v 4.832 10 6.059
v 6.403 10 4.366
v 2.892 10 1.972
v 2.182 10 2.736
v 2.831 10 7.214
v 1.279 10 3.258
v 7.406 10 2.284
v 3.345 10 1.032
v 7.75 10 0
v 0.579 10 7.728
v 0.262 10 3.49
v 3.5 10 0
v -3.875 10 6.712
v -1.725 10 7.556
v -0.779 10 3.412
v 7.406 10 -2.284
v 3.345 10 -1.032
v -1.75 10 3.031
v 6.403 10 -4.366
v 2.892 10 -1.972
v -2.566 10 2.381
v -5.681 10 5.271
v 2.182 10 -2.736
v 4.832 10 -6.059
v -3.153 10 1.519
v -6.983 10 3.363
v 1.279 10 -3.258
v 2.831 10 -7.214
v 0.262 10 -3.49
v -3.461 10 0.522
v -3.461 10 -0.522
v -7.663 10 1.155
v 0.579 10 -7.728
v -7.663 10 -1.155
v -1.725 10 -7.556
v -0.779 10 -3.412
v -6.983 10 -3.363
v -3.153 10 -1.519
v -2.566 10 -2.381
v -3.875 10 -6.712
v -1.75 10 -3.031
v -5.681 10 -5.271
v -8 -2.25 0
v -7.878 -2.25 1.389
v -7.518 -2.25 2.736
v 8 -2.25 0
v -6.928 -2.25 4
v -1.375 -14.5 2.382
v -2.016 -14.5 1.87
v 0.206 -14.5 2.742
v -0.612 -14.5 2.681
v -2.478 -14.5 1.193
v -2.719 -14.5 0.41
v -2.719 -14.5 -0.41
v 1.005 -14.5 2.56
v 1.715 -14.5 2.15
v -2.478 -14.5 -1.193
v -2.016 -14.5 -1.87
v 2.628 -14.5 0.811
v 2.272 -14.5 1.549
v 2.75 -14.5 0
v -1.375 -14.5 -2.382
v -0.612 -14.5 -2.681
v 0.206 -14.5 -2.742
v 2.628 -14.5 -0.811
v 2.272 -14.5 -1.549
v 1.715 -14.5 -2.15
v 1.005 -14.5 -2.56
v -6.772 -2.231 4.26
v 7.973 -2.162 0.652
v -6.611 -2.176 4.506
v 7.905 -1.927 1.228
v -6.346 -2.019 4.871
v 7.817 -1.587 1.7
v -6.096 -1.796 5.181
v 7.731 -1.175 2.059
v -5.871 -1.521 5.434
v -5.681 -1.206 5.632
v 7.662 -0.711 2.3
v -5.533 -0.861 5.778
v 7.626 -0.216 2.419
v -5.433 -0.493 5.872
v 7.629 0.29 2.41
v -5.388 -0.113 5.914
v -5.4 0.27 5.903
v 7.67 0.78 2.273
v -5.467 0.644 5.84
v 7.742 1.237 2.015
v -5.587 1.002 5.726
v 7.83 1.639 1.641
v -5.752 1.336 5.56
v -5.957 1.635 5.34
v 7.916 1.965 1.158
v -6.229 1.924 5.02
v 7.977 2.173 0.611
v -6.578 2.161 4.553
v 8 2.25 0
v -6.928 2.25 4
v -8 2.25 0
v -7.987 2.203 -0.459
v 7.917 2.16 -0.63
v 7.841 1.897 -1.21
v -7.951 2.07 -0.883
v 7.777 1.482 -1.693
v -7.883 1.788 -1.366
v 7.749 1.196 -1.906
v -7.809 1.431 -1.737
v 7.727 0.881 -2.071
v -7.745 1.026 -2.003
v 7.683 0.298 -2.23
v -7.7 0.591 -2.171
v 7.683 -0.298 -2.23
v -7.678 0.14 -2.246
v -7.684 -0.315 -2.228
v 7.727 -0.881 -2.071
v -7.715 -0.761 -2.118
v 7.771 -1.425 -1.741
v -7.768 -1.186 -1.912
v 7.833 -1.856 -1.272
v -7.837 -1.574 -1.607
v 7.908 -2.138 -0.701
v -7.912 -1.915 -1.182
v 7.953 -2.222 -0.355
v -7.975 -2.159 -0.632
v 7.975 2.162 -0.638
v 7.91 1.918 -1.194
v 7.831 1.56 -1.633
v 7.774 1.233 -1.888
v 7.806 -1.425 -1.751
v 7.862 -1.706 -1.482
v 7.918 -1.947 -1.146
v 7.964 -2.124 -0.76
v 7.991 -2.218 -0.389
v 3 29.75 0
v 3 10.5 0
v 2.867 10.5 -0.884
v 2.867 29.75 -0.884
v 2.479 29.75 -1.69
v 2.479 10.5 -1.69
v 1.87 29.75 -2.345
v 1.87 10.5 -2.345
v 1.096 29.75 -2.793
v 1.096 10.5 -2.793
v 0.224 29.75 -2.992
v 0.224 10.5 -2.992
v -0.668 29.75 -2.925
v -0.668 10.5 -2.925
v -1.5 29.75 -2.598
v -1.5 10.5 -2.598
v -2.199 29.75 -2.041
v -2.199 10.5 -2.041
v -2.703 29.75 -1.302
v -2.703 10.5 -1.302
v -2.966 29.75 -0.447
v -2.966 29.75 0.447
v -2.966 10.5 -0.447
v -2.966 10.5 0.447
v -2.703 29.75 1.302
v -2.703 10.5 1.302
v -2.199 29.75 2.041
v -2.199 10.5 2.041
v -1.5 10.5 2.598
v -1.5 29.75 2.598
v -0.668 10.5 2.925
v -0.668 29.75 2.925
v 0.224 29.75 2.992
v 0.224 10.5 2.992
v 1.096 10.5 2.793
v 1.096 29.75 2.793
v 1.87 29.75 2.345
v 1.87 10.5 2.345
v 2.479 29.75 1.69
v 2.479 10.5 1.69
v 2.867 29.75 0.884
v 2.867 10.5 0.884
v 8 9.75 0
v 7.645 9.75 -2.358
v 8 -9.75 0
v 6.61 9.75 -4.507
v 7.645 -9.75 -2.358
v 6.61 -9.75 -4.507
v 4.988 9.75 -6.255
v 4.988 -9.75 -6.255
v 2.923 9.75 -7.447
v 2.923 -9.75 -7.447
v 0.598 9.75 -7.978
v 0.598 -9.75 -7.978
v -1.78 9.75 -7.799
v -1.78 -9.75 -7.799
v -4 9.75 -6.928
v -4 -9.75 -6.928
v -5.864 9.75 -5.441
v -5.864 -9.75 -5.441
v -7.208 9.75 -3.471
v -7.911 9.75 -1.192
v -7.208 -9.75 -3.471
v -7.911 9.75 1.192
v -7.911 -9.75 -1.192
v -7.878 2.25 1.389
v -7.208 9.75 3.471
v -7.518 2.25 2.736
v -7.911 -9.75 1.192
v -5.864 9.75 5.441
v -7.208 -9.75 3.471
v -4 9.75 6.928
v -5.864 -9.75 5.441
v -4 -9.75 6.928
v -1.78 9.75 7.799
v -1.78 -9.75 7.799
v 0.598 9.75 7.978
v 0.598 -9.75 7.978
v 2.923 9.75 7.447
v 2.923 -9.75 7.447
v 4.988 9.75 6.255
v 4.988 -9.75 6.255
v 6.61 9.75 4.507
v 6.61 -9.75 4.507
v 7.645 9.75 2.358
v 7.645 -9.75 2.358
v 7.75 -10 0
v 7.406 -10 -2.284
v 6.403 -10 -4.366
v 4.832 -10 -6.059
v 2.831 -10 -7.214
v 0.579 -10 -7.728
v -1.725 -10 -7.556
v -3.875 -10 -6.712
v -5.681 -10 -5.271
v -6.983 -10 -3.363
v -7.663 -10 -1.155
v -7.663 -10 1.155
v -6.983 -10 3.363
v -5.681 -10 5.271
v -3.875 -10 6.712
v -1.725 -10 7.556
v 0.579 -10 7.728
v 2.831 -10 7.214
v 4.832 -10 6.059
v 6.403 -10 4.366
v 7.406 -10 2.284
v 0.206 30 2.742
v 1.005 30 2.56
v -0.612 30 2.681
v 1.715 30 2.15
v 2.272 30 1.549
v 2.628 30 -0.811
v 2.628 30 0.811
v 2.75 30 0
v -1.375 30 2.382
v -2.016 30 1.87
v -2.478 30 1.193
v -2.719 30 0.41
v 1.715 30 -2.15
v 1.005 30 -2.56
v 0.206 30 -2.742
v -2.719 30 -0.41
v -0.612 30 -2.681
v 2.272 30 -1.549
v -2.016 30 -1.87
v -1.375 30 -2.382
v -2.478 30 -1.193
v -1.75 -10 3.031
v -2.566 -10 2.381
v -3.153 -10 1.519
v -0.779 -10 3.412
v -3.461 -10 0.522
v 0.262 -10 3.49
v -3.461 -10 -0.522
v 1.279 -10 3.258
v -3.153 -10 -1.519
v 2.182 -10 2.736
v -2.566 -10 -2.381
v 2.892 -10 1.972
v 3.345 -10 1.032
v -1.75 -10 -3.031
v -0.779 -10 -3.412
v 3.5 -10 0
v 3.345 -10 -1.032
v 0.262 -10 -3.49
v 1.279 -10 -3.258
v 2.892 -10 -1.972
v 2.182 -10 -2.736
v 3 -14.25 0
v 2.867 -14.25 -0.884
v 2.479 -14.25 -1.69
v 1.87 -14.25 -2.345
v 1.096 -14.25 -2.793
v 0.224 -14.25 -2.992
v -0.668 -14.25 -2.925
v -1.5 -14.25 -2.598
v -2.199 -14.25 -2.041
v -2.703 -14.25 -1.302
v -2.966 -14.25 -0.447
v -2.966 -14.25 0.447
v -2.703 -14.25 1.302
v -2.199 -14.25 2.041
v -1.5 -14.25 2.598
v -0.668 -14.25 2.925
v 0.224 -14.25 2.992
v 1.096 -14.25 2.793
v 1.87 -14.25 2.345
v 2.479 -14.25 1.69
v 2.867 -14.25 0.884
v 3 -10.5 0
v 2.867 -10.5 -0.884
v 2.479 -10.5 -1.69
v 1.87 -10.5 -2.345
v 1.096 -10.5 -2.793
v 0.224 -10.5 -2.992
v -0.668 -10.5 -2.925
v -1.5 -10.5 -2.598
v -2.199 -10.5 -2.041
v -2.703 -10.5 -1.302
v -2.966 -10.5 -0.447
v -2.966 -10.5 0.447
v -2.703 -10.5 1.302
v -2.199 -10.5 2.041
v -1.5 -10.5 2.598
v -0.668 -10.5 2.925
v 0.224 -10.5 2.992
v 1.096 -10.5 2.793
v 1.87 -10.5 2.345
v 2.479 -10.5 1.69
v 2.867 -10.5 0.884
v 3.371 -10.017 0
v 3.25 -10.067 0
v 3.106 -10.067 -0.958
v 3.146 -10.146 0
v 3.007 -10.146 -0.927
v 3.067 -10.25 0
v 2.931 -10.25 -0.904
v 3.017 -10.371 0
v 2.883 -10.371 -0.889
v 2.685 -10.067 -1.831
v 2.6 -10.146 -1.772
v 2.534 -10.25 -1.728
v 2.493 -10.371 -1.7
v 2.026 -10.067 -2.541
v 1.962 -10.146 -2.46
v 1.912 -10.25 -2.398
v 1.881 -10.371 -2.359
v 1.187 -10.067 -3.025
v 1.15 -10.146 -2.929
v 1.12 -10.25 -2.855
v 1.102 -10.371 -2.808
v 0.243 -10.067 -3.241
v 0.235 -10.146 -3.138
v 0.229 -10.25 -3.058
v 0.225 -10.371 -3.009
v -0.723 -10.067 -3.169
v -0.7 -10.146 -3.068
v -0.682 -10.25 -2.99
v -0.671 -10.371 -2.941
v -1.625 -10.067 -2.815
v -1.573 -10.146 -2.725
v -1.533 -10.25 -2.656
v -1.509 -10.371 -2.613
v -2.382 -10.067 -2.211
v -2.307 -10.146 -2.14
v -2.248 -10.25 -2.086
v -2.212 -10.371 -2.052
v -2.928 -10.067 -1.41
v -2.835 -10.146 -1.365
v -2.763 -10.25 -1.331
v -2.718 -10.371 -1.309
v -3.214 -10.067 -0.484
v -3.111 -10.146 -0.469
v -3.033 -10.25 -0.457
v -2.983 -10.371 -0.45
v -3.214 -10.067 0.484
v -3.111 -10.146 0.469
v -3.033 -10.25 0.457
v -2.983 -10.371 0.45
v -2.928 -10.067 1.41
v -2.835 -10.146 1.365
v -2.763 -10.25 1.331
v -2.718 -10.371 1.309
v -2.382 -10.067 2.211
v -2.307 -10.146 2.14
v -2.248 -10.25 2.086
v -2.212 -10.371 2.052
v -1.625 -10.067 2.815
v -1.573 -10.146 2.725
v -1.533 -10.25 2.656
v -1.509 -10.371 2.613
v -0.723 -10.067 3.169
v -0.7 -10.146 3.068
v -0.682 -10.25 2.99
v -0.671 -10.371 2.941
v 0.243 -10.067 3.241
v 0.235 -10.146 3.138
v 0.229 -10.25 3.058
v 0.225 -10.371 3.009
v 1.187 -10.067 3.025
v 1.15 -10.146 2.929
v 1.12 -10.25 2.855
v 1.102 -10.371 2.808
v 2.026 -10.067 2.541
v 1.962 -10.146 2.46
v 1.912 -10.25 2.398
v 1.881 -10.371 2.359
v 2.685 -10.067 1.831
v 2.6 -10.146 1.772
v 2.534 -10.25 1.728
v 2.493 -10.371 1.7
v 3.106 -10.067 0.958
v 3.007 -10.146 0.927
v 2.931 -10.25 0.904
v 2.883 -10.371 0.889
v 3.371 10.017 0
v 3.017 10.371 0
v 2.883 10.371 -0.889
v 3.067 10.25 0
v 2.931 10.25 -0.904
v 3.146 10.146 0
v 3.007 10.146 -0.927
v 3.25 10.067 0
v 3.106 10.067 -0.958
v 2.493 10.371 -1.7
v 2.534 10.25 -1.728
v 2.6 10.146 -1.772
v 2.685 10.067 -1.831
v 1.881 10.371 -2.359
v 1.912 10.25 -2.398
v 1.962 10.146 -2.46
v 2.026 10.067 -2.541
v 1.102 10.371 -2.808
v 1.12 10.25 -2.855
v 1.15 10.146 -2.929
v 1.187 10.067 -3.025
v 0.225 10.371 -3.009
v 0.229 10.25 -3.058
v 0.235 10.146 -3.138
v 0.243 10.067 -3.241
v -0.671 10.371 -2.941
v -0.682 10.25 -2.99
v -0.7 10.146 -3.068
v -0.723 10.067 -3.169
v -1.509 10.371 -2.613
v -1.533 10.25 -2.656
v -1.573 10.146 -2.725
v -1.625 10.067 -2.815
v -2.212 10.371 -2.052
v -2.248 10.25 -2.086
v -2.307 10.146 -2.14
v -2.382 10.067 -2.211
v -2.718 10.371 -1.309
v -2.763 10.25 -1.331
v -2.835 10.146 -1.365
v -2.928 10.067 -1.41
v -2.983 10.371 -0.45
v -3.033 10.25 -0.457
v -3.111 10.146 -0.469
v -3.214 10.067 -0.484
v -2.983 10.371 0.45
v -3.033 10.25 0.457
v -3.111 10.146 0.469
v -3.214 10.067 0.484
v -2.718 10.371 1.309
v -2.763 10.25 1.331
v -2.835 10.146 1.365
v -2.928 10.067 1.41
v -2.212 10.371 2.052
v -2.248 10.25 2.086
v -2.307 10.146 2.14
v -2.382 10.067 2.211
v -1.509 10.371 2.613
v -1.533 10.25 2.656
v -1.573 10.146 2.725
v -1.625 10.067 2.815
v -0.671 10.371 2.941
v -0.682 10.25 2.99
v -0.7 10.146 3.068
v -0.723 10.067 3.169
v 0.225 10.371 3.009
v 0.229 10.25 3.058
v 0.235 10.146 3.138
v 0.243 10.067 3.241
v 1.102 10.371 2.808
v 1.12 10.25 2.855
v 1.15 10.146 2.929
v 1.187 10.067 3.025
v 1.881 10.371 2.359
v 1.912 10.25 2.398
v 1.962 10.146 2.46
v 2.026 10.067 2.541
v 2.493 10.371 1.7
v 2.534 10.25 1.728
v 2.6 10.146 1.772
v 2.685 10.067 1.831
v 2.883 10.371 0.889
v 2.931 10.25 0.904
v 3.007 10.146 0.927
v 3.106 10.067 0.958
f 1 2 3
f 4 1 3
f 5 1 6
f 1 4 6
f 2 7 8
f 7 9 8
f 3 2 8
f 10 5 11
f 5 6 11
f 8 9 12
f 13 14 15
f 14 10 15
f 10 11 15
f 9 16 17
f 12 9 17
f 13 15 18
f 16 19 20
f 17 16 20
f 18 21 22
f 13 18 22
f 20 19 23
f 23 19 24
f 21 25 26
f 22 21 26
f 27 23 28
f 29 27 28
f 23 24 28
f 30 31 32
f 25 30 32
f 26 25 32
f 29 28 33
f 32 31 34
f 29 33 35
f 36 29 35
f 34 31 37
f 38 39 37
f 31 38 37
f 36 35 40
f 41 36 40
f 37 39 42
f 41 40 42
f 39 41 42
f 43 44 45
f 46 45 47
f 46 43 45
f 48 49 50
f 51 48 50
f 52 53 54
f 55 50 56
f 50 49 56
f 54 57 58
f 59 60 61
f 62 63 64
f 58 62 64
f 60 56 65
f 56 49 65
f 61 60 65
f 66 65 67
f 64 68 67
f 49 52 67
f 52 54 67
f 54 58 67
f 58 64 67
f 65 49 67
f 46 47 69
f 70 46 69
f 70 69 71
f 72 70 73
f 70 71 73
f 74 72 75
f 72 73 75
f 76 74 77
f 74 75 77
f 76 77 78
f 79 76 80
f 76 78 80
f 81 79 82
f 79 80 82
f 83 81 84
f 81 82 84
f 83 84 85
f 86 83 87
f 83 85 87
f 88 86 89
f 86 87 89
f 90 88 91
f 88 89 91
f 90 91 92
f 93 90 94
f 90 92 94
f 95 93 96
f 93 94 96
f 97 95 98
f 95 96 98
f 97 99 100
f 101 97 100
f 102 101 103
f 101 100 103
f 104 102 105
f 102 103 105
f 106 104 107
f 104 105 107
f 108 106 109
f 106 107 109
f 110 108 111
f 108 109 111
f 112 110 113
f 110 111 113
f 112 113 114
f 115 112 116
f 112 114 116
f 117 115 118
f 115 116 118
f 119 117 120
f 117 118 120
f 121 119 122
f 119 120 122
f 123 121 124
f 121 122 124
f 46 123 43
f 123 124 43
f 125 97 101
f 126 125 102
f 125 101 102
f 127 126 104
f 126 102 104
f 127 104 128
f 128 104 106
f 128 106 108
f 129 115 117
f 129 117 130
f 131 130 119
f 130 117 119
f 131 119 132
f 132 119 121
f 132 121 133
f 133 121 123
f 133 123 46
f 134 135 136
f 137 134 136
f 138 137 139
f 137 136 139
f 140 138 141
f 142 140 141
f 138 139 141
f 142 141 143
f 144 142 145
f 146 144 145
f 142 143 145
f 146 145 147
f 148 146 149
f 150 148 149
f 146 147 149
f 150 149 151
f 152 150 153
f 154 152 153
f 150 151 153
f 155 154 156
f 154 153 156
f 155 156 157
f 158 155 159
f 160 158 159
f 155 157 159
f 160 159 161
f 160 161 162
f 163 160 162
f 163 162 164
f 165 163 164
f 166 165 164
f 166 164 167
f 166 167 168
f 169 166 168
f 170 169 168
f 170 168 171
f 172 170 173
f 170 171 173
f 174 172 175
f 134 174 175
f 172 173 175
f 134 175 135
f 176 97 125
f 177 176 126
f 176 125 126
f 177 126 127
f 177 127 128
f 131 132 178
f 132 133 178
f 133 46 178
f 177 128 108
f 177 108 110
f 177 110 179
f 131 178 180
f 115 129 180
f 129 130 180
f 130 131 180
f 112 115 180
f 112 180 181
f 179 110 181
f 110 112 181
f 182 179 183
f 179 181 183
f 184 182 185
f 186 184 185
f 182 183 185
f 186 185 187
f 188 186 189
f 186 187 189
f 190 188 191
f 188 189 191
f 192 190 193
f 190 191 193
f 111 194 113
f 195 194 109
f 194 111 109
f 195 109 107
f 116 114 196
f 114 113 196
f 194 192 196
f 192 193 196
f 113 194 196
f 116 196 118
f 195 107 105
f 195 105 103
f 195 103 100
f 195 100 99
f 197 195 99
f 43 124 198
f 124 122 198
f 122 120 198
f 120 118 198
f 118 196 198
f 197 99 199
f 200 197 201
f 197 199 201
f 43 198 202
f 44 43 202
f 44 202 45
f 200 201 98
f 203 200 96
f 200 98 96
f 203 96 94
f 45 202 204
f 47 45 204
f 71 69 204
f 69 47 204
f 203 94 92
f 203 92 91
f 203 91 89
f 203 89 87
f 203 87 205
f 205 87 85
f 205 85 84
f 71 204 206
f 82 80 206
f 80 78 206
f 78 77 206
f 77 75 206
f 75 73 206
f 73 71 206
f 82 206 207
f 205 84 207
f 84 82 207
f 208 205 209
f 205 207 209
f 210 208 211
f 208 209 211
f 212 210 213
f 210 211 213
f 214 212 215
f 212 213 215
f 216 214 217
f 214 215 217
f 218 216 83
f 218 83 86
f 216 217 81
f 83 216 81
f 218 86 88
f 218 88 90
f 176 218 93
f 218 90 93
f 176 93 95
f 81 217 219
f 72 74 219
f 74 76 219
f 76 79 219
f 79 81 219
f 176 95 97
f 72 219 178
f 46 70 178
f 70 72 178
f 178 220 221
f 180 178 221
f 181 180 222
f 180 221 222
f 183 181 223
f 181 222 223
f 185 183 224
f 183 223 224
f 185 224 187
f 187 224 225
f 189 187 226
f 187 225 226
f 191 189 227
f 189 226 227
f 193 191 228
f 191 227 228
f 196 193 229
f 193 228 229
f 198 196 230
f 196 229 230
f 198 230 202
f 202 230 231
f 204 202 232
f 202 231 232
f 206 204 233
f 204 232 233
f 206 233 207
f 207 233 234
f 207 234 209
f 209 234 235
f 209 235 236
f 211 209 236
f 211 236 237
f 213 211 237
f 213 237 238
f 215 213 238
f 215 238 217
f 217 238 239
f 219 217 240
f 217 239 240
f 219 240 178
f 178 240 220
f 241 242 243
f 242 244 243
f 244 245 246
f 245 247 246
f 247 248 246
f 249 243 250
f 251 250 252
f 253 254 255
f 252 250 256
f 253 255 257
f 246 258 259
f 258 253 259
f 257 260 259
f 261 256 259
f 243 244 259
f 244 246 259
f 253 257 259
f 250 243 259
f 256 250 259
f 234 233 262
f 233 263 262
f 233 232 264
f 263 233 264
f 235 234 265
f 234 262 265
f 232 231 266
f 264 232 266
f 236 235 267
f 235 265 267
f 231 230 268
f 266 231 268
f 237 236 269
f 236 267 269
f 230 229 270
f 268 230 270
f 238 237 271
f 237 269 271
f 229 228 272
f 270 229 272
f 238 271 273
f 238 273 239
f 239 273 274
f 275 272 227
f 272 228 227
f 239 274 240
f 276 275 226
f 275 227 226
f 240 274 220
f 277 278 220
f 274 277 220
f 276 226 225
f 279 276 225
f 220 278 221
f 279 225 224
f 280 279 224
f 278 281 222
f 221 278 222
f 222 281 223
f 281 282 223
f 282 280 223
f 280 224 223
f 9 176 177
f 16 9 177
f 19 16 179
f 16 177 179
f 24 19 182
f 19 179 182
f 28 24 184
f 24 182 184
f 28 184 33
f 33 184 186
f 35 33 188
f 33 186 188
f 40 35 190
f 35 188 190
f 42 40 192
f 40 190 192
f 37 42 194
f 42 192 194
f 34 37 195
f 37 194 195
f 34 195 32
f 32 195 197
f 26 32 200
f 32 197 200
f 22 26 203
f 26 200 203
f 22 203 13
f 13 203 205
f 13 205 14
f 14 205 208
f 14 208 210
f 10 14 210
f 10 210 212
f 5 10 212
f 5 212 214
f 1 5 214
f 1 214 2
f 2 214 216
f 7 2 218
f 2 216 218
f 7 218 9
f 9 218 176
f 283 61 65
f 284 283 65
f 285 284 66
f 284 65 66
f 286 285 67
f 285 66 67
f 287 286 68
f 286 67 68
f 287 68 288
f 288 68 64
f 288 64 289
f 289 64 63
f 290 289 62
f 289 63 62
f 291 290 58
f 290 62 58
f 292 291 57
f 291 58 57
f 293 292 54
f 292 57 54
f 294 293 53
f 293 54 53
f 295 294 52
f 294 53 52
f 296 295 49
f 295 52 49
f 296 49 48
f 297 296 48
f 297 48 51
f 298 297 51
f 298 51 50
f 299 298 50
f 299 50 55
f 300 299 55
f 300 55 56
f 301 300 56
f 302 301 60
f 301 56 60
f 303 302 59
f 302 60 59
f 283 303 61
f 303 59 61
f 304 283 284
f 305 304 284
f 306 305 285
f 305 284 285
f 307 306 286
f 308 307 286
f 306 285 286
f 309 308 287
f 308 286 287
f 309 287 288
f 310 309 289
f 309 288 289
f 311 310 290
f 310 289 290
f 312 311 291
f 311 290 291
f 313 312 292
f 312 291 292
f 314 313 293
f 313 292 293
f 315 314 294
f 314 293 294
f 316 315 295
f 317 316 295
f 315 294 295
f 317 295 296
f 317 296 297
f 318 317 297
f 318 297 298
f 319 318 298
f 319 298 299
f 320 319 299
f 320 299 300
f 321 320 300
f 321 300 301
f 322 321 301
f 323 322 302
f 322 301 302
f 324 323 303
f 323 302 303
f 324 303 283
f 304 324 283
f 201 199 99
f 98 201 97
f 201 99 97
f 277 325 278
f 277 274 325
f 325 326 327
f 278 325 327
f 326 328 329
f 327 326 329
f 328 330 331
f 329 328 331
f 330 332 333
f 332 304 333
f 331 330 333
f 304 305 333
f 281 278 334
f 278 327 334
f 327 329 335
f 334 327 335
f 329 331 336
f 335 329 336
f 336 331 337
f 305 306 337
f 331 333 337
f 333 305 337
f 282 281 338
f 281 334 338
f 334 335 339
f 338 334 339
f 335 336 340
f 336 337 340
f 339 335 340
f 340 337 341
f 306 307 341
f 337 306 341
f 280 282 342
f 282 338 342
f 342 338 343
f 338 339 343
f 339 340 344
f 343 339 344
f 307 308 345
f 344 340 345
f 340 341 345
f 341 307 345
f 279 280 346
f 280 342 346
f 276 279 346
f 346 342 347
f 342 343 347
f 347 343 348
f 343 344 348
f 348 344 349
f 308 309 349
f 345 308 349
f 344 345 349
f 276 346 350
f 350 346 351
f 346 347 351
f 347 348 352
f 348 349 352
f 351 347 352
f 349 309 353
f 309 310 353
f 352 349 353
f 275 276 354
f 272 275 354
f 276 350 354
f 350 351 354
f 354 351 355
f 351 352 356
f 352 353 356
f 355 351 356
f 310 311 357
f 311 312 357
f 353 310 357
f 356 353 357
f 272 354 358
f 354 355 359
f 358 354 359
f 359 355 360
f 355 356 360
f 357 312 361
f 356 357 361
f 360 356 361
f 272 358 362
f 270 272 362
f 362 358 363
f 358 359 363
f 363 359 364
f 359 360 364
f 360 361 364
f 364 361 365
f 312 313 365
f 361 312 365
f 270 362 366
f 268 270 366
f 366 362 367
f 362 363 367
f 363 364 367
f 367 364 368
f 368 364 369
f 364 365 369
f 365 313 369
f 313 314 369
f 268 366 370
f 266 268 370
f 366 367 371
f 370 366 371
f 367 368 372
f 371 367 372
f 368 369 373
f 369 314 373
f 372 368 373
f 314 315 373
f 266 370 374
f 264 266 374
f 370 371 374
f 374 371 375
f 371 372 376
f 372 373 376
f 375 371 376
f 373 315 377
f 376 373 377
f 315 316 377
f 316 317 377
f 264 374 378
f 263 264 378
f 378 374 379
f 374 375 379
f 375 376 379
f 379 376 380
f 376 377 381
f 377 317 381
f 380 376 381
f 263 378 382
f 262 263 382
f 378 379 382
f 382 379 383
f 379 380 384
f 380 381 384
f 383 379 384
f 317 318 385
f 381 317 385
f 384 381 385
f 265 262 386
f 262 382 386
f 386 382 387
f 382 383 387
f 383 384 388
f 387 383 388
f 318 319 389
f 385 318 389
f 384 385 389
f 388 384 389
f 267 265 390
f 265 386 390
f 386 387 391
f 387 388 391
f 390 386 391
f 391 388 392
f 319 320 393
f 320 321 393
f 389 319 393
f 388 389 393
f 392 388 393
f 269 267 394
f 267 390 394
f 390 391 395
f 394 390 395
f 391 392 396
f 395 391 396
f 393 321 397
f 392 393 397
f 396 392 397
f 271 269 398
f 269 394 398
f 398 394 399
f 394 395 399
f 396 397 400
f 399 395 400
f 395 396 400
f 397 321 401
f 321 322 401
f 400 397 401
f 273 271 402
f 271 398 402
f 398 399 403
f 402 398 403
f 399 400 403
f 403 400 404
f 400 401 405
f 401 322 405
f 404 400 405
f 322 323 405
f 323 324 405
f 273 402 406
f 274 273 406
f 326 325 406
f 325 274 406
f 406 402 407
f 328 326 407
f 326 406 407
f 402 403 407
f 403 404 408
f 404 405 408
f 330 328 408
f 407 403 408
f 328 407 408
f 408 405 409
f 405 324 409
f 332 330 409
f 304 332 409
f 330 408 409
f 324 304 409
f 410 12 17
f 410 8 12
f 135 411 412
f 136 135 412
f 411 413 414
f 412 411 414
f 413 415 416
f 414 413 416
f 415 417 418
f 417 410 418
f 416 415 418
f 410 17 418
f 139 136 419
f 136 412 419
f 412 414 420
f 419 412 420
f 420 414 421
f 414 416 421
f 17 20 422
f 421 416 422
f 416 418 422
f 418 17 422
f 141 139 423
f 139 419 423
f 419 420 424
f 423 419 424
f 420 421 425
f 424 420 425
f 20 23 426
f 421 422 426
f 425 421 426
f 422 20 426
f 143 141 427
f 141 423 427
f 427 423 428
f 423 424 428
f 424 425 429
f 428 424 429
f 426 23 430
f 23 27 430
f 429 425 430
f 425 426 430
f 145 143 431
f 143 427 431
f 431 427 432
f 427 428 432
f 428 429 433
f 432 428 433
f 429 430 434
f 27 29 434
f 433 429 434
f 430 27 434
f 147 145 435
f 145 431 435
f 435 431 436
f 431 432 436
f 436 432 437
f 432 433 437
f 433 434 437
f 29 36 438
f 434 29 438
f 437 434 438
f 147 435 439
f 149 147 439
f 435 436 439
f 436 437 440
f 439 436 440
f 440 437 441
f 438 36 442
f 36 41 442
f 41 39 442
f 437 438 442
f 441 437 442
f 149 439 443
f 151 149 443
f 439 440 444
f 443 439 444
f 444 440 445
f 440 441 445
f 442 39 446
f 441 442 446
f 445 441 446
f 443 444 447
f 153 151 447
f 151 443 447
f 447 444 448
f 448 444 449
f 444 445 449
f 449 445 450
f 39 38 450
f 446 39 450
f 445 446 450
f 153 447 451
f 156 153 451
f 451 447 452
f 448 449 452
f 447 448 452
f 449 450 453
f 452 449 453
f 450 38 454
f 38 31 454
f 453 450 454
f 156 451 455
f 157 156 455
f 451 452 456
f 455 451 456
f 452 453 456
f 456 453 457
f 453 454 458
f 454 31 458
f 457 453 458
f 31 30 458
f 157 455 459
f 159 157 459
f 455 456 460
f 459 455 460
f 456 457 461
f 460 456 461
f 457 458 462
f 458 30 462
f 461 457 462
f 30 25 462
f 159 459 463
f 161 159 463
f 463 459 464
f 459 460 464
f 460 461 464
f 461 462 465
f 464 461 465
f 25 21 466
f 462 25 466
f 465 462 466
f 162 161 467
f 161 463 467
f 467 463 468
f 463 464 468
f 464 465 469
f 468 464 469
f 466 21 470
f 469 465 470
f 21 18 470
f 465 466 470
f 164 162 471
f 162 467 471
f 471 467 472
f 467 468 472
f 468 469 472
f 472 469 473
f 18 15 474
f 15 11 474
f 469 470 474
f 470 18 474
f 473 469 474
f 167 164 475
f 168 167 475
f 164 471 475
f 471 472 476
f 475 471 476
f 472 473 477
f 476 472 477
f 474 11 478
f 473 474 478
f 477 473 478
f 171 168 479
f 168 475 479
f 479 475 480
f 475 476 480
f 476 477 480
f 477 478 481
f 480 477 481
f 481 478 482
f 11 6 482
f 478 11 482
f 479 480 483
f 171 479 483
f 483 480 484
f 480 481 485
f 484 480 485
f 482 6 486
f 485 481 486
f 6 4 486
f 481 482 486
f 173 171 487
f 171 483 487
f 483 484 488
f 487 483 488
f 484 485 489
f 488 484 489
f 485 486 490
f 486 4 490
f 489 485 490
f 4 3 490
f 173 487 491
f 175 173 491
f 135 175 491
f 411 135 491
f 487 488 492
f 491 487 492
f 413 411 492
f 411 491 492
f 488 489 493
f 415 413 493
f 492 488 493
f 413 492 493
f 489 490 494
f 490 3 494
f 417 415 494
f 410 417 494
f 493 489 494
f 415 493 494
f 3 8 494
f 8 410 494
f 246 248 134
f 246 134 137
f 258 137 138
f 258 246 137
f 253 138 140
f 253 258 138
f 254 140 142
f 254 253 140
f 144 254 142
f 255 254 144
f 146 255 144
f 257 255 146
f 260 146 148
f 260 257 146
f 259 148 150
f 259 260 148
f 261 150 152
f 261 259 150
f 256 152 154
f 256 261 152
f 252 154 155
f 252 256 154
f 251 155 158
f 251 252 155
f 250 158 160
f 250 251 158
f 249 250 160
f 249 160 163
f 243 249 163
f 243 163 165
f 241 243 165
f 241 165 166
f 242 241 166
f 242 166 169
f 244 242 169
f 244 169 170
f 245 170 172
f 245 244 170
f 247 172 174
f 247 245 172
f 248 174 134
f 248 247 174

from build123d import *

# Parameters (mm, degrees)
ESBO_O2_R                  = 2.25
CORTE_EXTRUS_O2_DEPTH      = 17
ESBO_O7_R                  = 2.25
CORTE_EXTRUS_O6_DEPTH      = 3.070552483
CORTE_EXTRUS_O6_DEPTH_BACK = 18.525365704
CUT_EXTRUDE1_DEPTH         = 2.25
FILLET1_R                  = 0.5
CHAMFER1_SIZE              = 0.25
CHAMFER4_SIZE              = 0.25


with BuildPart() as part:
    # Esboço1 → Revolução1 (revolve)
    with BuildSketch(Plane.XY):
        Polygon((0, 30), (3, 30), (3, 10), (8, 10), (8, -10), (3, -10), (3, -14.5), (0, -14.5), (0, 0), align=None)
    revolve(axis=Axis((0, 0, 0), (0, 1, 0)))

    # Esboço2 → Corte-extrusão2 (cut, through all)
    with BuildSketch(Plane.ZY.offset(8)):
        Circle(ESBO_O2_R)
    extrude(amount=-CORTE_EXTRUS_O2_DEPTH, mode=Mode.SUBTRACT)

    # Esboço7 → Corte-extrusão6 (cut, two sides)
    with BuildSketch(Plane(origin=(-6.92820323, 0, 4), x_dir=(0.258819045, 0, 0.965925826), z_dir=(-0.965925826, 0, 0.258819045))) as corte_extrus_o6_sk:
        Circle(ESBO_O7_R)
    extrude(amount=CORTE_EXTRUS_O6_DEPTH, mode=Mode.SUBTRACT)
    extrude(corte_extrus_o6_sk.sketch, amount=-CORTE_EXTRUS_O6_DEPTH_BACK, mode=Mode.SUBTRACT)

    # Sketch1 → Cut-Extrude1 (cut, symmetric)
    with BuildSketch(Plane(origin=(0, 0, 0), x_dir=(1, 0, 0), z_dir=(0, 1, 0))):
        Polygon((8, 0), (-10.844388007, 0), (-10.495748768, -4.955920946), align=None)
    extrude(amount=CUT_EXTRUDE1_DEPTH, both=True, mode=Mode.SUBTRACT)

    # Fillet1
    fillet1_edges = [part.edges().sort_by_distance(p)[0] for p in [
        (-3, -10, 0),
        (-3, 10, 0),
    ]]
    fillet(fillet1_edges, radius=FILLET1_R)

    # Chamfer1
    chamfer1_edges = [part.edges().sort_by_distance(p)[0] for p in [
        (-3, -14.5, 0),
        (-3, 30, 0),
    ]]
    chamfer(chamfer1_edges, length=CHAMFER1_SIZE)

    # Chamfer4
    chamfer4_edges = [part.edges().sort_by_distance(p)[0] for p in [
        (-8, -10, 0),
        (-8, 10, 0),
    ]]
    chamfer(chamfer4_edges, length=CHAMFER4_SIZE)


solid = part.part
